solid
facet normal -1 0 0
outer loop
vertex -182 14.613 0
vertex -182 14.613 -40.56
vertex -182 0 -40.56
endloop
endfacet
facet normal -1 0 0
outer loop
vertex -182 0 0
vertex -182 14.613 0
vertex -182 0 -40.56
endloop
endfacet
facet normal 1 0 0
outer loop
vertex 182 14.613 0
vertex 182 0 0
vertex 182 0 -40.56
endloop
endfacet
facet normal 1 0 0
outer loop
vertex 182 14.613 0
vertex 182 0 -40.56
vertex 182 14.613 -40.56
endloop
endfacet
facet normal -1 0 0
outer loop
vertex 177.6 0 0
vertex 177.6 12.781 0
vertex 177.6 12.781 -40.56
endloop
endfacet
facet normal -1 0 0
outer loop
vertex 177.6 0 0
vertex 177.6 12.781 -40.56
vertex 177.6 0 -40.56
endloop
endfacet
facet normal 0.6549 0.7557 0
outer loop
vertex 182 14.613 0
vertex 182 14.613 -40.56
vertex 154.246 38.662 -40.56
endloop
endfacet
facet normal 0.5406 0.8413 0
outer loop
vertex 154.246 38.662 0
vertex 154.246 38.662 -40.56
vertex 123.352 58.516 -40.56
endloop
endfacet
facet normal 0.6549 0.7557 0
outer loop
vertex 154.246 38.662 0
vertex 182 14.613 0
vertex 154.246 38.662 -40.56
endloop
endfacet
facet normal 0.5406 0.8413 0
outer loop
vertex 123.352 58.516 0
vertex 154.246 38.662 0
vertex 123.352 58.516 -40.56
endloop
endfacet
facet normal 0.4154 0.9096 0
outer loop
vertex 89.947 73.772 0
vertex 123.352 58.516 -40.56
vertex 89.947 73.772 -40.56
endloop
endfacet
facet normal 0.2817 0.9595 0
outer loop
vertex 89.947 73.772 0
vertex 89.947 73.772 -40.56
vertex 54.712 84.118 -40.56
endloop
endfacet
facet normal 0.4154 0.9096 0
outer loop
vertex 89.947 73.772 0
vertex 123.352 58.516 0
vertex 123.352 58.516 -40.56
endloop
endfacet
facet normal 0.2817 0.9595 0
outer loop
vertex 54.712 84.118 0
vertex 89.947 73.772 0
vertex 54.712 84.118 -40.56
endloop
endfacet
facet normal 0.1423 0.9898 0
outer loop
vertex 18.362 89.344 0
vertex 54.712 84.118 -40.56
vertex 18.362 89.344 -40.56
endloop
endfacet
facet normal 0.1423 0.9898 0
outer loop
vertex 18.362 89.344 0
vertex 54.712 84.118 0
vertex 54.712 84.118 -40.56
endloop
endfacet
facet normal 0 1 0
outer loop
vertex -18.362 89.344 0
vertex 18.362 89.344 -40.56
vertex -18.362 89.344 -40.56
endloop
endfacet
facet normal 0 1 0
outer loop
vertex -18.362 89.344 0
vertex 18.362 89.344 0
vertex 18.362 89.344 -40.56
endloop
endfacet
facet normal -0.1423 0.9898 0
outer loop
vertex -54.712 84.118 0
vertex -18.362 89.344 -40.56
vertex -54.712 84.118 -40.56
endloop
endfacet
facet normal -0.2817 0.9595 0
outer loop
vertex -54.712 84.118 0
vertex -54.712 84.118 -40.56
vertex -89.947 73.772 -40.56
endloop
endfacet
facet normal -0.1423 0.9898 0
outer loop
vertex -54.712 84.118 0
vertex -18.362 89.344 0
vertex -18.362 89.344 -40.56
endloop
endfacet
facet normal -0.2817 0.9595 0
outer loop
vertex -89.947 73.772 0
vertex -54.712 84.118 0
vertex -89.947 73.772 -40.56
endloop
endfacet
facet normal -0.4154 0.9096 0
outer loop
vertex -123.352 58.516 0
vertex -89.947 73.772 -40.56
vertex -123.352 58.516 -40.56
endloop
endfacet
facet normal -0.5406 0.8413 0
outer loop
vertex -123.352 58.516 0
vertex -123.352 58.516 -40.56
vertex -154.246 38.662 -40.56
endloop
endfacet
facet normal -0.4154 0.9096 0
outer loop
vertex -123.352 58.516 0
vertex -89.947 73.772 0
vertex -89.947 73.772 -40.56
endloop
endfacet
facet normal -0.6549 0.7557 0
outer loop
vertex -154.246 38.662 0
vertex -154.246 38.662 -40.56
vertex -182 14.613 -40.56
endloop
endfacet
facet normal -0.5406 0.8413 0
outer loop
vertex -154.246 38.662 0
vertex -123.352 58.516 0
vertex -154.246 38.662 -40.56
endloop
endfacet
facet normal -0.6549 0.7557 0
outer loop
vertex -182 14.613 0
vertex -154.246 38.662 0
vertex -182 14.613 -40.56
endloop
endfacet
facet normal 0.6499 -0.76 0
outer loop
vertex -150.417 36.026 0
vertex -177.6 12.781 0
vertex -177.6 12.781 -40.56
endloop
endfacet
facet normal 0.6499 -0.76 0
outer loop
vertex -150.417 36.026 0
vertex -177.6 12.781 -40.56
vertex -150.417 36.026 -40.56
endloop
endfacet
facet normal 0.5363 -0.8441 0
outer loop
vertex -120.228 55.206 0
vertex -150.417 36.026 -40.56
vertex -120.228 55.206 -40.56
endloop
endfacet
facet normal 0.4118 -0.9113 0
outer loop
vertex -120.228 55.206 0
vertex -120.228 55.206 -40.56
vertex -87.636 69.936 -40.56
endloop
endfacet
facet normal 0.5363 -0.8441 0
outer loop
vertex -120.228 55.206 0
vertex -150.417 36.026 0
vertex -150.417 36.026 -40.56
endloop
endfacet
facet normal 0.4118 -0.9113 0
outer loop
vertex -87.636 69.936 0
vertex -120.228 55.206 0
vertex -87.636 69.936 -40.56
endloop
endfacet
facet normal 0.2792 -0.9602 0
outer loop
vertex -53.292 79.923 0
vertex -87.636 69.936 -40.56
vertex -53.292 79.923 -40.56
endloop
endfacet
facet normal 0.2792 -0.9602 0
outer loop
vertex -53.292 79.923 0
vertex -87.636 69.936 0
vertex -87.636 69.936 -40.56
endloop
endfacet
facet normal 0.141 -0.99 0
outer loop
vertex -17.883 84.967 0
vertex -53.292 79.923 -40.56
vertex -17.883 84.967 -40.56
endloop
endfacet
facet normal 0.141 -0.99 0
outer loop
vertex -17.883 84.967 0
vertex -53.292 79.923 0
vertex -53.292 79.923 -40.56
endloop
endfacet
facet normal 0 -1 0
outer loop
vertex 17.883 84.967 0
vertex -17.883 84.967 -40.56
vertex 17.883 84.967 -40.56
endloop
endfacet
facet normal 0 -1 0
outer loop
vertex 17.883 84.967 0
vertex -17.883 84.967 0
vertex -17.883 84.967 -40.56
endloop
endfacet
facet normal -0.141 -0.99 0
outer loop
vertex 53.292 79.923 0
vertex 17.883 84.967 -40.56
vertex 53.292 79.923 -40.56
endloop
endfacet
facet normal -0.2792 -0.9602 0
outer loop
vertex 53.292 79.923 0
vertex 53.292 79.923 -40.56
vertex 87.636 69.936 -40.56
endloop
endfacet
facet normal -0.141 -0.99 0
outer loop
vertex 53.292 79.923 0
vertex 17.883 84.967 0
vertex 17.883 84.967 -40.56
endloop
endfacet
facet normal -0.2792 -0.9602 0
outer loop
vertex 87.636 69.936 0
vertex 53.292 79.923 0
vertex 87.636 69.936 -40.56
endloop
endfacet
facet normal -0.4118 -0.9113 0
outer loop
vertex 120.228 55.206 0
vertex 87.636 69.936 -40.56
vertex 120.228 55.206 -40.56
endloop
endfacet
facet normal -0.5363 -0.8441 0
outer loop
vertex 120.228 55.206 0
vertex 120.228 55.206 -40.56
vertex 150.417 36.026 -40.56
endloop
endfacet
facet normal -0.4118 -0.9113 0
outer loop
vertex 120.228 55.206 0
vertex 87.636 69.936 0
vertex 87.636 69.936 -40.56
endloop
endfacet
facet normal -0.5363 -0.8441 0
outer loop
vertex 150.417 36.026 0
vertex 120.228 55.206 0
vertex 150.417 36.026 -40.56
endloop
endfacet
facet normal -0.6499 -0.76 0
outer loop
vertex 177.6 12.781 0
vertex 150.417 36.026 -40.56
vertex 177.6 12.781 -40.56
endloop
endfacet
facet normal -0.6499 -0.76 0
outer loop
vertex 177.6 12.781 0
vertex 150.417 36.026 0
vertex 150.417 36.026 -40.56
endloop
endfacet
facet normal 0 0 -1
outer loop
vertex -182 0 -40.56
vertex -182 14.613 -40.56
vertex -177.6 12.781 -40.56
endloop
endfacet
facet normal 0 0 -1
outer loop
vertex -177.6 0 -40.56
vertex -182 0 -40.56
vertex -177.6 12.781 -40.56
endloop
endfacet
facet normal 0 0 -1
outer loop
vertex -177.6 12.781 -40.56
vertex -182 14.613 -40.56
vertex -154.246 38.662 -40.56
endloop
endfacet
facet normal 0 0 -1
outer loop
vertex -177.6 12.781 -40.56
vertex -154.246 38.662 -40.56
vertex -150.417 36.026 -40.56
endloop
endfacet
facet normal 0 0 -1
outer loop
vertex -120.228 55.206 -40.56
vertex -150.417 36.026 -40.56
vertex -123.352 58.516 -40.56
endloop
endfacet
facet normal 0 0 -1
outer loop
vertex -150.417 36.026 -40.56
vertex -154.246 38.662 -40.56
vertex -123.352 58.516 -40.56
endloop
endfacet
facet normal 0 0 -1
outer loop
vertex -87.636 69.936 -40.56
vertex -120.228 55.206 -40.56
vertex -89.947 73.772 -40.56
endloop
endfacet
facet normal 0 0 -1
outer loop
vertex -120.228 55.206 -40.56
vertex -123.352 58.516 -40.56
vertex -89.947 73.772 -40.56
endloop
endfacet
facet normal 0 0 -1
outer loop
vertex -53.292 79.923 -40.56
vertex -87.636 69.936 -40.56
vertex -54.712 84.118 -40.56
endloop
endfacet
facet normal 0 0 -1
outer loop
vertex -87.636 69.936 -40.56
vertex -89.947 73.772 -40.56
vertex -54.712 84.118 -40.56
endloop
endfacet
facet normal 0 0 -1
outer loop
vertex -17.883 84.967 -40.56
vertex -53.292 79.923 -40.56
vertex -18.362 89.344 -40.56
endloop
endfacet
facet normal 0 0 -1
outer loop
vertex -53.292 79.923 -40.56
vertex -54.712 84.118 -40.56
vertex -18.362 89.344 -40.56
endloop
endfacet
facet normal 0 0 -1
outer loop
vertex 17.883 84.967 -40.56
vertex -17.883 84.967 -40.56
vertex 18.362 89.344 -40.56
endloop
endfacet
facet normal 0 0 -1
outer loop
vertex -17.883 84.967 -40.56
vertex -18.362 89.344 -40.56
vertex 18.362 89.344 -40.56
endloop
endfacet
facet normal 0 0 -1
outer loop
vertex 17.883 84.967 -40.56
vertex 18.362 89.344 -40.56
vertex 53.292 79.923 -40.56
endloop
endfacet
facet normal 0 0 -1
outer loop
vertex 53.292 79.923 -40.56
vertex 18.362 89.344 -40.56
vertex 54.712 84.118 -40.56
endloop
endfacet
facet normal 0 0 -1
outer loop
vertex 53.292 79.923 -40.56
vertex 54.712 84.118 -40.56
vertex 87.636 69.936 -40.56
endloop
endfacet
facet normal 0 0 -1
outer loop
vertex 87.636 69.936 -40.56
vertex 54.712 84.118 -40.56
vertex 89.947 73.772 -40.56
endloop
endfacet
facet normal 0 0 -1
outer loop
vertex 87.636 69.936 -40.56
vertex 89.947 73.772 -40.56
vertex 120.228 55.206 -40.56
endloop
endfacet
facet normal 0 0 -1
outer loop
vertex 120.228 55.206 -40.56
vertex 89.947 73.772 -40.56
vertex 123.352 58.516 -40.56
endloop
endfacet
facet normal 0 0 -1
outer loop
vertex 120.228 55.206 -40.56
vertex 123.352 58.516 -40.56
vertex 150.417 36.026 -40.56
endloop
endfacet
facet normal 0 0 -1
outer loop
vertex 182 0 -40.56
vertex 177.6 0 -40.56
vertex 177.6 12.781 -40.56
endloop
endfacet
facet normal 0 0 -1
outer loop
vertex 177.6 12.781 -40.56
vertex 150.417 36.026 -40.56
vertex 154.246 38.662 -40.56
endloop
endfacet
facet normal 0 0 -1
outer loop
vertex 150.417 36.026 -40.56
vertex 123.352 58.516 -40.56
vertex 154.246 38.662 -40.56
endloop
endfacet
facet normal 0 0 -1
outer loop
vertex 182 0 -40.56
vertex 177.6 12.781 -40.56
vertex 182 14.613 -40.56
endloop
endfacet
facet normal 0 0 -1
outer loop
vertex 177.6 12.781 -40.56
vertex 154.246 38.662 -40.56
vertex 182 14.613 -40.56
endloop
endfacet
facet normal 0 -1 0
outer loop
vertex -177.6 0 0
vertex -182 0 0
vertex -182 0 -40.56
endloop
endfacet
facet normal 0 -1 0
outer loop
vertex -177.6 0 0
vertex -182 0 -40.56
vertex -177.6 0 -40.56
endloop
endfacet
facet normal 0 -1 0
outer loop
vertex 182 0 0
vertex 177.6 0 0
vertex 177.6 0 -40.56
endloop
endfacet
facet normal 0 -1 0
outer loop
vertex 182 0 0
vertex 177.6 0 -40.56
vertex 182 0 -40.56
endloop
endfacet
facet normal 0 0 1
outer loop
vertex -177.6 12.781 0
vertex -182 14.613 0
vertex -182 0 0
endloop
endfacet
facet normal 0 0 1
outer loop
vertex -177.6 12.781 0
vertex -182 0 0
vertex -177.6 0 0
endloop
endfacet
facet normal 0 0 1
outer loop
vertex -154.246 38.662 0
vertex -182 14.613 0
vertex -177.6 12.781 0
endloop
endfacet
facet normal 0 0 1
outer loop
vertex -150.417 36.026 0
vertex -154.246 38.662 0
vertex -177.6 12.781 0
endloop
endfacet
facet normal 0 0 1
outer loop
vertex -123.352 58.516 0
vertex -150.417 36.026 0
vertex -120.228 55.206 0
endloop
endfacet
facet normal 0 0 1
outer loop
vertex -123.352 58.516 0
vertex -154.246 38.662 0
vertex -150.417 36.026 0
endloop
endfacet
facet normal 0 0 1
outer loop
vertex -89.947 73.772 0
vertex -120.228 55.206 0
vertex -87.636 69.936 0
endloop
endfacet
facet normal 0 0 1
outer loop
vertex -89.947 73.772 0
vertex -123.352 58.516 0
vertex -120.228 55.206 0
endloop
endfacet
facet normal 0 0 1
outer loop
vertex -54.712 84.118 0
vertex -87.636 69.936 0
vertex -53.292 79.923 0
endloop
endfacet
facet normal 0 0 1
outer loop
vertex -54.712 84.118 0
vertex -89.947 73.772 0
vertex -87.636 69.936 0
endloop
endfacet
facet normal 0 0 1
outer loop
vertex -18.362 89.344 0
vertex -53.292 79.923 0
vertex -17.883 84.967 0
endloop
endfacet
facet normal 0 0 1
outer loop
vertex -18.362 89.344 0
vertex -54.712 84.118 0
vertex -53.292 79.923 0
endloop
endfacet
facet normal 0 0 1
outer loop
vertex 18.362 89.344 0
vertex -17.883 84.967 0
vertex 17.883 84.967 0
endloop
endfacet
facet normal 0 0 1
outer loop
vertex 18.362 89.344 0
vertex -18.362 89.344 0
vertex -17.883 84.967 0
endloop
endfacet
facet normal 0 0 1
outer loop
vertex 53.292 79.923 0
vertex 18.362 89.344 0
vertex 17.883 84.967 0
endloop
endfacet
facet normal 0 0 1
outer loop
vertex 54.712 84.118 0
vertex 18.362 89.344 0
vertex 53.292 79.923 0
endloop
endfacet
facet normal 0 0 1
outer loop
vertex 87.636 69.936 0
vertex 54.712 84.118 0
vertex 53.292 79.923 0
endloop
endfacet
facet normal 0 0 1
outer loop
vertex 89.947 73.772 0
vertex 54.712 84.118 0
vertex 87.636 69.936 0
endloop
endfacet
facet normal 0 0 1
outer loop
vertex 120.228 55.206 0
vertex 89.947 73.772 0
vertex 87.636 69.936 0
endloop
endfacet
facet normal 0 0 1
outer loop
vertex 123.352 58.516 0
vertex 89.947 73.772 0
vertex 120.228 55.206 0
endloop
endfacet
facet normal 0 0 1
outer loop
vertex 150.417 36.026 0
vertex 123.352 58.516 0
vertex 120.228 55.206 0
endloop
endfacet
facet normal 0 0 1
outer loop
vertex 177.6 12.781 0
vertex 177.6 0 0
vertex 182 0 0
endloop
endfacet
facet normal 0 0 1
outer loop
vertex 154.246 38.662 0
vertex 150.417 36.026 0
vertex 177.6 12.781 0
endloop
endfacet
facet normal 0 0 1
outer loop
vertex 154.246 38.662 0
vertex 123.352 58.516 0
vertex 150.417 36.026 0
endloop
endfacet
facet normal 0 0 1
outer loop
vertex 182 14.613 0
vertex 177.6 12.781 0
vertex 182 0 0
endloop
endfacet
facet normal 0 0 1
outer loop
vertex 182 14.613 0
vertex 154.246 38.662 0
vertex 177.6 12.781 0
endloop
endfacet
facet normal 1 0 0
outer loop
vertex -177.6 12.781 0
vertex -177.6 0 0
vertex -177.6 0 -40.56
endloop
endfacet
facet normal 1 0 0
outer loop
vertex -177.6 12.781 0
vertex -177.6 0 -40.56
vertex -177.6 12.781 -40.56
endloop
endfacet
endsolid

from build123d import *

# Parameters (mm, degrees)
BOSS_EXTRUDE1_DEPTH = 40.56


with BuildPart() as part:
    # Sketch1 → Boss-Extrude1 (new body)
    with BuildSketch(Plane.XY):
        with BuildLine():
            ThreePointArc((182, 14.613131648), (0, 90), (-182, 14.613131648))
            Line((-182, 14.613131648), (-182, 0))
            Line((-182, 0), (-177.6, 0))
            Line((-177.6, 0), (-177.6, 4.4))
            Line((-177.6, 4.4), (-177.6, 12.781374018))
            ThreePointArc((-177.6, 12.781374018), (0, 85.6), (177.6, 12.781374018))
            Line((177.6, 12.781374018), (177.6, 4.4))
            Line((177.6, 4.4), (177.6, 0))
            Line((177.6, 0), (182, 0))
            Line((182, 0), (182, 14.613131648))
        make_face()
    extrude(amount=-BOSS_EXTRUDE1_DEPTH)


solid = part.part
